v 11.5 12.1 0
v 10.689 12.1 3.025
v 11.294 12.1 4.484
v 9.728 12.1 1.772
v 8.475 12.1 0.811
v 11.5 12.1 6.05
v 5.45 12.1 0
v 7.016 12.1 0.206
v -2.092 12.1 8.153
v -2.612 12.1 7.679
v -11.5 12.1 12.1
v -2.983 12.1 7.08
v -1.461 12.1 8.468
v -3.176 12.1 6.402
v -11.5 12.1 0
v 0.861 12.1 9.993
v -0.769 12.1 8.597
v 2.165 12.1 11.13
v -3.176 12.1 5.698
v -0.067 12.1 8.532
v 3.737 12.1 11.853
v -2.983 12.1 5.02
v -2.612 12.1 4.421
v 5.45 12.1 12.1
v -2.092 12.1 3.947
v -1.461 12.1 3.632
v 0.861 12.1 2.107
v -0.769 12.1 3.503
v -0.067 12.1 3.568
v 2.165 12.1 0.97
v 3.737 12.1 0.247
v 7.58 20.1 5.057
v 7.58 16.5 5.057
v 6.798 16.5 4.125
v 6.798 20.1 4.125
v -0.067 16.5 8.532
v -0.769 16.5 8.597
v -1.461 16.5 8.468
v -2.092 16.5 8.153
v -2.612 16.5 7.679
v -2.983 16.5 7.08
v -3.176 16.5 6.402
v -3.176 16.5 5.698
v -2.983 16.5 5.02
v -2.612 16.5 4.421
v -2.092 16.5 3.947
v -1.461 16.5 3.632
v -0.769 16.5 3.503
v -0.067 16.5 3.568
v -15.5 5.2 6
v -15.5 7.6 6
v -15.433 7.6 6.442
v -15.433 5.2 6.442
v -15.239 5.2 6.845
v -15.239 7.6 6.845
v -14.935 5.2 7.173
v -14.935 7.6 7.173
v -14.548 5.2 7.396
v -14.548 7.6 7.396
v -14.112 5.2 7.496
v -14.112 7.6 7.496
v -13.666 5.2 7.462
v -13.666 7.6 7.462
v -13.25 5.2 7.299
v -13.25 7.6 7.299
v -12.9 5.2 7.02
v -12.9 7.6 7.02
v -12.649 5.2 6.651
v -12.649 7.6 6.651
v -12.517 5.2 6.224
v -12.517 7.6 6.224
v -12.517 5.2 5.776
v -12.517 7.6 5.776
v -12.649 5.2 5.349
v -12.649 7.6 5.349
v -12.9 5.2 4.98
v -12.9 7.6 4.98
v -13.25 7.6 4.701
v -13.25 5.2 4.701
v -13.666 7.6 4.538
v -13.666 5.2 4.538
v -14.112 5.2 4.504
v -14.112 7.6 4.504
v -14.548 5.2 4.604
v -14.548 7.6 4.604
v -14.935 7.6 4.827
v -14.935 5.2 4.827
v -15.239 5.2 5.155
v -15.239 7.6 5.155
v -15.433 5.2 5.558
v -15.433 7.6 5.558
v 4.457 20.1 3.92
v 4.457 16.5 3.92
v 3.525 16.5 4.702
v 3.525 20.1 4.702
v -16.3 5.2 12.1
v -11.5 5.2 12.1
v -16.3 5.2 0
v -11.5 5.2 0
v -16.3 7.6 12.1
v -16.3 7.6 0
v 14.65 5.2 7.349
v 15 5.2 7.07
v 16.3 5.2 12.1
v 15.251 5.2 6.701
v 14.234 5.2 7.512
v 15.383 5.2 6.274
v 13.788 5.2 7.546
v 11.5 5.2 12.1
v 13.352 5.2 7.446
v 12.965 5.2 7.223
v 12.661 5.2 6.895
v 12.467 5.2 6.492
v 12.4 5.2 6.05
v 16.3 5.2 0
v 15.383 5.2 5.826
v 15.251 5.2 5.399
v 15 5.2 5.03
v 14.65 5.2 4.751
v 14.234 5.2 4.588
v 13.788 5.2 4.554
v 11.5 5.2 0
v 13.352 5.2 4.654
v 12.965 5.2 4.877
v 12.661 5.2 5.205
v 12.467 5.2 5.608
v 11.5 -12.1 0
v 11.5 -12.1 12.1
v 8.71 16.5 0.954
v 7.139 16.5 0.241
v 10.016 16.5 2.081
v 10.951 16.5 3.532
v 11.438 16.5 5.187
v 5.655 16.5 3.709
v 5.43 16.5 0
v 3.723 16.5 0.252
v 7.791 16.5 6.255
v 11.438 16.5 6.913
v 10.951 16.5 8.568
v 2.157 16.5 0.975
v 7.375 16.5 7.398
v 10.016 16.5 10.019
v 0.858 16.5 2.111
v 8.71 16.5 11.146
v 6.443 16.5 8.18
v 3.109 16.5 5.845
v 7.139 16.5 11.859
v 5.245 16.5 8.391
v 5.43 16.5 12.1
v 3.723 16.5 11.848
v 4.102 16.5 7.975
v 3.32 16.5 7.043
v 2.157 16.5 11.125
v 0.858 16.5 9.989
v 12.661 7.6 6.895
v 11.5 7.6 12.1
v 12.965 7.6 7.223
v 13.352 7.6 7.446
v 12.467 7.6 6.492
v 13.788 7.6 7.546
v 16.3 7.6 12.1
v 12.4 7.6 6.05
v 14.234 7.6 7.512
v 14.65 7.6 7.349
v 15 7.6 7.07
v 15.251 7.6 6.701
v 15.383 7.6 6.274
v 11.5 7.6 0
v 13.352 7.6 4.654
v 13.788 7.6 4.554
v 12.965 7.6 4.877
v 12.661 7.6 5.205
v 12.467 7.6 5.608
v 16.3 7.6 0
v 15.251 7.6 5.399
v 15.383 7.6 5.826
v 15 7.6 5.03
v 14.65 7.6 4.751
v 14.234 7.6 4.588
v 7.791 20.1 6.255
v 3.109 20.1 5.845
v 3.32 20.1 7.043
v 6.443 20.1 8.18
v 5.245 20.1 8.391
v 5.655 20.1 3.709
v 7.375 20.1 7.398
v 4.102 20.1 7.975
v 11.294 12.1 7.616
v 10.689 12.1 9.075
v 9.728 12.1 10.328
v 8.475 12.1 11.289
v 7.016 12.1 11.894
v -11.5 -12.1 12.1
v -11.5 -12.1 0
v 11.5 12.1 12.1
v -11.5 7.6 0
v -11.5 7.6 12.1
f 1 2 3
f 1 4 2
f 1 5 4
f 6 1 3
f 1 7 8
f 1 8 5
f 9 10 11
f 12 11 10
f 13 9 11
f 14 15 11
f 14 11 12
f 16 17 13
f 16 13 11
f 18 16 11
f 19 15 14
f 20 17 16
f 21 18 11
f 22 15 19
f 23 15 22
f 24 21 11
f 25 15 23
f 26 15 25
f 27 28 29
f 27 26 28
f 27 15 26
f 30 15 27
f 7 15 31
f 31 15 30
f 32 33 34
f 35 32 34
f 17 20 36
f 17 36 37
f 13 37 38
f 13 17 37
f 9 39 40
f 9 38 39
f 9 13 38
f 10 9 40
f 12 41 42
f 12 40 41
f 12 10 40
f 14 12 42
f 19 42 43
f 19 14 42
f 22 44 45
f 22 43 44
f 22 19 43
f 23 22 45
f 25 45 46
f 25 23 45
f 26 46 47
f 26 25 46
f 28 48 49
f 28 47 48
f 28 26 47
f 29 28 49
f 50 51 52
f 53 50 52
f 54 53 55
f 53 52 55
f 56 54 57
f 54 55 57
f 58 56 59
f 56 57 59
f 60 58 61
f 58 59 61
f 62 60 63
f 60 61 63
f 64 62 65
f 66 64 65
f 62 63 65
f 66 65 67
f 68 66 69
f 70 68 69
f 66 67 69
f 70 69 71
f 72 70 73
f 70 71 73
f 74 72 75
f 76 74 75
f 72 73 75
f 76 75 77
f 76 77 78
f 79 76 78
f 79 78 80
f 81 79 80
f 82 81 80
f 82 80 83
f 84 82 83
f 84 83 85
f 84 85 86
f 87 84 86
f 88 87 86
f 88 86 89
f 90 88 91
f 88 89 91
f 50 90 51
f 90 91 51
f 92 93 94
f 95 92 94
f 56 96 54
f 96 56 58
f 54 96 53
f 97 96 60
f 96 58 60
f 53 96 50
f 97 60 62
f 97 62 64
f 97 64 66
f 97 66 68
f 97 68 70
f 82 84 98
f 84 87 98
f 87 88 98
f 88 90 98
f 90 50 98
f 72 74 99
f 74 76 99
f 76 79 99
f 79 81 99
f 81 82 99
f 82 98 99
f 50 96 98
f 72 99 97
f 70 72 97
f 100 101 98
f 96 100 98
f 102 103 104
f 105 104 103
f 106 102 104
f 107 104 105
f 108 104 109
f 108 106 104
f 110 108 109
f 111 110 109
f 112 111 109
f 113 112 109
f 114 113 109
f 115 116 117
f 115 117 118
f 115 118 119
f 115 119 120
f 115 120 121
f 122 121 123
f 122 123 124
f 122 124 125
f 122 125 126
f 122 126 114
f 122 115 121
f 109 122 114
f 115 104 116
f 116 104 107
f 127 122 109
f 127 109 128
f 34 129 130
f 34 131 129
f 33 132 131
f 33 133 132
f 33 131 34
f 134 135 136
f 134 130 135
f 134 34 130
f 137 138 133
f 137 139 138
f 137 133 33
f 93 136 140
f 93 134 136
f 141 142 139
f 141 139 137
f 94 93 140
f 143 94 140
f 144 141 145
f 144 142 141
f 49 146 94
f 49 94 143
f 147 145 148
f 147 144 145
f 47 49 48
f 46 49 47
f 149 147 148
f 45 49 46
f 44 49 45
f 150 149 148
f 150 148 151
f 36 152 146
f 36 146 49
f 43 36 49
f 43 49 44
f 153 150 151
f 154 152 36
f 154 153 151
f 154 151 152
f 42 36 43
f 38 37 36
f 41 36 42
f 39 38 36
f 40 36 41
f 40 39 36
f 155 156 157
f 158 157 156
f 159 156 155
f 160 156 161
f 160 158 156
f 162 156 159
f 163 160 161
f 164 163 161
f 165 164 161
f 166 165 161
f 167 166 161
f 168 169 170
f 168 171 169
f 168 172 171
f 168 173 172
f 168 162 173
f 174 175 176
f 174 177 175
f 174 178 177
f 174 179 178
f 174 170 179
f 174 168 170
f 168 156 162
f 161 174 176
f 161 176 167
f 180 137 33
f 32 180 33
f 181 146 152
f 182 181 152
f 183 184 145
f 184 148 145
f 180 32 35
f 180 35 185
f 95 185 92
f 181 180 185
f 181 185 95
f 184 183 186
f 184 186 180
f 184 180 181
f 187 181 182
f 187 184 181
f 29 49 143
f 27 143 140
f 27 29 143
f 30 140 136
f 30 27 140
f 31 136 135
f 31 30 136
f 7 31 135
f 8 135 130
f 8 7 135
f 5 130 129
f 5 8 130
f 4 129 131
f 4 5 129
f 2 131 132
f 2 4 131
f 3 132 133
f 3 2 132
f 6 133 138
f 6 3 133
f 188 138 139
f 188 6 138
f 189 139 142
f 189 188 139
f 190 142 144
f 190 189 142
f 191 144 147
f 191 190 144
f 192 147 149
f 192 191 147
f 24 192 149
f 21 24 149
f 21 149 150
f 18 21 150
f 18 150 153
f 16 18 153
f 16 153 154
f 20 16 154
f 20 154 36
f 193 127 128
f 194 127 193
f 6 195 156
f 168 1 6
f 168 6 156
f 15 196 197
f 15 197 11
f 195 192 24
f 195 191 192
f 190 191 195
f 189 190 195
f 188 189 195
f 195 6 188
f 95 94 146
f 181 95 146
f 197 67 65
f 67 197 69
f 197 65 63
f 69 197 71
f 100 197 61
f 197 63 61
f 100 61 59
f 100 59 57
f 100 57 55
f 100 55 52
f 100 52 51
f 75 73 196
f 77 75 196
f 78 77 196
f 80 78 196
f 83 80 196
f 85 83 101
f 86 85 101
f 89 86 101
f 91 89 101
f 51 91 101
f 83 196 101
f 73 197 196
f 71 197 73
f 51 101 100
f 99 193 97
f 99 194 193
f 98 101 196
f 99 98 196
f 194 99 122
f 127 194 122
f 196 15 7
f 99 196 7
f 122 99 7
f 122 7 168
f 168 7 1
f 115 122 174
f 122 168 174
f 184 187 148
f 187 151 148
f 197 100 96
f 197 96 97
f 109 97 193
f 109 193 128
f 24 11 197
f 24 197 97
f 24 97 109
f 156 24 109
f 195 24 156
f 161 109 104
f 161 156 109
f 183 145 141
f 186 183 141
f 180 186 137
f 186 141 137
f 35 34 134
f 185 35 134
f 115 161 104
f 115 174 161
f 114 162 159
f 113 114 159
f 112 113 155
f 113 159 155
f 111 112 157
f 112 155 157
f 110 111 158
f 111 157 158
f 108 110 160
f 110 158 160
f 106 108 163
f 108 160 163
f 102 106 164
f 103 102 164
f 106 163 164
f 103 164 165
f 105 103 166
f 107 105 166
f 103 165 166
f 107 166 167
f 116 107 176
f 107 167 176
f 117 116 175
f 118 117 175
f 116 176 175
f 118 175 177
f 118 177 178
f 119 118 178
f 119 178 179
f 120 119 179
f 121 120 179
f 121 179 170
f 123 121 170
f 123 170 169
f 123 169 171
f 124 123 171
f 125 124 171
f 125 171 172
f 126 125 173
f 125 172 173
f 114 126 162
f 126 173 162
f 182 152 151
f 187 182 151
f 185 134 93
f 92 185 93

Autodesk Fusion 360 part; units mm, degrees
sketch "Sketch1" plane through (0, 0, 0) normal (0, 0, 1) x (1, 0, 0)
  line L0 (11.5, -12.1) -> (-11.5, -12.1)
  line L1 (-11.5, 12.1) -> (11.5, 12.1)
  line L2 (11.5, -12.1) -> (-11.5, 12.1) construction
  line L3 (-11.5, -12.1) -> (11.5, 12.1) construction
  line L4 (11.5, 7.6) -> (16.3, 7.6)
  line L5 (16.3, 7.6) -> (16.3, 5.2)
  line L6 (16.3, 5.2) -> (11.5, 5.2)
  line L7 (-16.3, 5.2) -> (-11.5, 5.2)
  line L8 (-16.3, 7.6) -> (-16.3, 5.2)
  line L9 (-11.5, 7.6) -> (-16.3, 7.6)
  line L10 (11.5, 12.1) -> (11.5, 7.6)
  line L11 (11.5, 5.2) -> (11.5, -12.1)
  line L12 (-11.5, -12.1) -> (-11.5, 5.2)
  line L13 (-11.5, 7.6) -> (-11.5, 12.1)
  dimension "d1" = 23
  dimension "d2" = 24.2
  dimension "d3" = 4.5
  dimension "d4" = 4.8
  dimension "d5" = 2.4
extrude "Extrude1" add sketch "Sketch1" along normal blind 12.1
sketch "Sketch2" plane through (0, 7.6, 0) normal (0, 1, 0) x (-1, 0, 0)
  line L0 (-16.3, 0) -> (-11.5, 0)
  line L1 (-11.5, 0) -> (-11.5, 12.1)
  line L2 (-11.5, 12.1) -> (-16.3, 12.1)
  line L3 (-16.3, 12.1) -> (-16.3, 0)
  circle A0 centre (14, 6) radius 1.5
  circle A1 centre (-13.9, 6.05) radius 1.5
  dimension "d8" = 3
  dimension "d9" = 3
extrude "Extrude2" cut sketch "Sketch2" against normal blind 5 contours A0 | A1
sketch "Sketch3" plane through (0, 12.1, 0) normal (0, 1, 0) x (-1, 0, 0)
  line L0 (-11.5, 0) -> (11.5, 0)
  line L1 (11.5, 0) -> (11.5, 12.1)
  line L2 (11.5, 12.1) -> (-11.5, 12.1)
  line L3 (-11.5, 12.1) -> (-11.5, 0)
  line L4 (0.6, 6.05) -> (0.65, 6.05)
  arc A0 (0.0672, 3.5675) -> (0.0672, 8.5325) centre (0.65, 6.05) ccw
  arc A1 (0.0672, 8.5325) -> (0.0672, 3.5675) centre (-5.45, 6.05) ccw
  dimension "d12" = 6.1
  dimension "d13" = 5.1
extrude "Extrude3" add sketch "Sketch3" along normal blind 4.4 contours A0 A1
sketch "Sketch4" plane through (0, 16.5, 0) normal (0, 1, 0) x (-1, 0, 0)
  arc A0 (0.0672, 8.5325) -> (0.0672, 3.5675) centre (-5.45, 6.05) ccw
  arc A1 (0.0672, 3.5675) -> (0.0672, 8.5325) centre (0.65, 6.05) ccw
  circle A2 centre (-5.45, 6.05) radius 2.35
  line L0 (-4.4572, 3.92) -> (-3.5252, 4.7018)
  line L1 (-3.5252, 4.7018) -> (-3.109, 5.8448)
  line L2 (-3.109, 5.8448) -> (-3.32, 7.0428)
  line L3 (-3.32, 7.0428) -> (-4.1018, 7.9748)
  line L4 (-4.1018, 7.9748) -> (-5.2448, 8.391)
  line L5 (-5.2448, 8.391) -> (-6.4428, 8.18)
  line L6 (-6.4428, 8.18) -> (-7.3748, 7.3982)
  line L7 (-7.3748, 7.3982) -> (-7.791, 6.2552)
  line L8 (-7.791, 6.2552) -> (-7.58, 5.0572)
  line L9 (-7.58, 5.0572) -> (-6.7982, 4.1252)
  line L10 (-6.7982, 4.1252) -> (-5.6552, 3.709)
  line L11 (-5.6552, 3.709) -> (-4.4572, 3.92)
  point P0 (-5.45, 6.05)
  dimension "d16" = 4.7
extrude "Extrude4" add sketch "Sketch4" along normal blind 3.6 contours L0 L1 L2 L3 L4 L5 L6 L7 L8 L9 L10 L11
